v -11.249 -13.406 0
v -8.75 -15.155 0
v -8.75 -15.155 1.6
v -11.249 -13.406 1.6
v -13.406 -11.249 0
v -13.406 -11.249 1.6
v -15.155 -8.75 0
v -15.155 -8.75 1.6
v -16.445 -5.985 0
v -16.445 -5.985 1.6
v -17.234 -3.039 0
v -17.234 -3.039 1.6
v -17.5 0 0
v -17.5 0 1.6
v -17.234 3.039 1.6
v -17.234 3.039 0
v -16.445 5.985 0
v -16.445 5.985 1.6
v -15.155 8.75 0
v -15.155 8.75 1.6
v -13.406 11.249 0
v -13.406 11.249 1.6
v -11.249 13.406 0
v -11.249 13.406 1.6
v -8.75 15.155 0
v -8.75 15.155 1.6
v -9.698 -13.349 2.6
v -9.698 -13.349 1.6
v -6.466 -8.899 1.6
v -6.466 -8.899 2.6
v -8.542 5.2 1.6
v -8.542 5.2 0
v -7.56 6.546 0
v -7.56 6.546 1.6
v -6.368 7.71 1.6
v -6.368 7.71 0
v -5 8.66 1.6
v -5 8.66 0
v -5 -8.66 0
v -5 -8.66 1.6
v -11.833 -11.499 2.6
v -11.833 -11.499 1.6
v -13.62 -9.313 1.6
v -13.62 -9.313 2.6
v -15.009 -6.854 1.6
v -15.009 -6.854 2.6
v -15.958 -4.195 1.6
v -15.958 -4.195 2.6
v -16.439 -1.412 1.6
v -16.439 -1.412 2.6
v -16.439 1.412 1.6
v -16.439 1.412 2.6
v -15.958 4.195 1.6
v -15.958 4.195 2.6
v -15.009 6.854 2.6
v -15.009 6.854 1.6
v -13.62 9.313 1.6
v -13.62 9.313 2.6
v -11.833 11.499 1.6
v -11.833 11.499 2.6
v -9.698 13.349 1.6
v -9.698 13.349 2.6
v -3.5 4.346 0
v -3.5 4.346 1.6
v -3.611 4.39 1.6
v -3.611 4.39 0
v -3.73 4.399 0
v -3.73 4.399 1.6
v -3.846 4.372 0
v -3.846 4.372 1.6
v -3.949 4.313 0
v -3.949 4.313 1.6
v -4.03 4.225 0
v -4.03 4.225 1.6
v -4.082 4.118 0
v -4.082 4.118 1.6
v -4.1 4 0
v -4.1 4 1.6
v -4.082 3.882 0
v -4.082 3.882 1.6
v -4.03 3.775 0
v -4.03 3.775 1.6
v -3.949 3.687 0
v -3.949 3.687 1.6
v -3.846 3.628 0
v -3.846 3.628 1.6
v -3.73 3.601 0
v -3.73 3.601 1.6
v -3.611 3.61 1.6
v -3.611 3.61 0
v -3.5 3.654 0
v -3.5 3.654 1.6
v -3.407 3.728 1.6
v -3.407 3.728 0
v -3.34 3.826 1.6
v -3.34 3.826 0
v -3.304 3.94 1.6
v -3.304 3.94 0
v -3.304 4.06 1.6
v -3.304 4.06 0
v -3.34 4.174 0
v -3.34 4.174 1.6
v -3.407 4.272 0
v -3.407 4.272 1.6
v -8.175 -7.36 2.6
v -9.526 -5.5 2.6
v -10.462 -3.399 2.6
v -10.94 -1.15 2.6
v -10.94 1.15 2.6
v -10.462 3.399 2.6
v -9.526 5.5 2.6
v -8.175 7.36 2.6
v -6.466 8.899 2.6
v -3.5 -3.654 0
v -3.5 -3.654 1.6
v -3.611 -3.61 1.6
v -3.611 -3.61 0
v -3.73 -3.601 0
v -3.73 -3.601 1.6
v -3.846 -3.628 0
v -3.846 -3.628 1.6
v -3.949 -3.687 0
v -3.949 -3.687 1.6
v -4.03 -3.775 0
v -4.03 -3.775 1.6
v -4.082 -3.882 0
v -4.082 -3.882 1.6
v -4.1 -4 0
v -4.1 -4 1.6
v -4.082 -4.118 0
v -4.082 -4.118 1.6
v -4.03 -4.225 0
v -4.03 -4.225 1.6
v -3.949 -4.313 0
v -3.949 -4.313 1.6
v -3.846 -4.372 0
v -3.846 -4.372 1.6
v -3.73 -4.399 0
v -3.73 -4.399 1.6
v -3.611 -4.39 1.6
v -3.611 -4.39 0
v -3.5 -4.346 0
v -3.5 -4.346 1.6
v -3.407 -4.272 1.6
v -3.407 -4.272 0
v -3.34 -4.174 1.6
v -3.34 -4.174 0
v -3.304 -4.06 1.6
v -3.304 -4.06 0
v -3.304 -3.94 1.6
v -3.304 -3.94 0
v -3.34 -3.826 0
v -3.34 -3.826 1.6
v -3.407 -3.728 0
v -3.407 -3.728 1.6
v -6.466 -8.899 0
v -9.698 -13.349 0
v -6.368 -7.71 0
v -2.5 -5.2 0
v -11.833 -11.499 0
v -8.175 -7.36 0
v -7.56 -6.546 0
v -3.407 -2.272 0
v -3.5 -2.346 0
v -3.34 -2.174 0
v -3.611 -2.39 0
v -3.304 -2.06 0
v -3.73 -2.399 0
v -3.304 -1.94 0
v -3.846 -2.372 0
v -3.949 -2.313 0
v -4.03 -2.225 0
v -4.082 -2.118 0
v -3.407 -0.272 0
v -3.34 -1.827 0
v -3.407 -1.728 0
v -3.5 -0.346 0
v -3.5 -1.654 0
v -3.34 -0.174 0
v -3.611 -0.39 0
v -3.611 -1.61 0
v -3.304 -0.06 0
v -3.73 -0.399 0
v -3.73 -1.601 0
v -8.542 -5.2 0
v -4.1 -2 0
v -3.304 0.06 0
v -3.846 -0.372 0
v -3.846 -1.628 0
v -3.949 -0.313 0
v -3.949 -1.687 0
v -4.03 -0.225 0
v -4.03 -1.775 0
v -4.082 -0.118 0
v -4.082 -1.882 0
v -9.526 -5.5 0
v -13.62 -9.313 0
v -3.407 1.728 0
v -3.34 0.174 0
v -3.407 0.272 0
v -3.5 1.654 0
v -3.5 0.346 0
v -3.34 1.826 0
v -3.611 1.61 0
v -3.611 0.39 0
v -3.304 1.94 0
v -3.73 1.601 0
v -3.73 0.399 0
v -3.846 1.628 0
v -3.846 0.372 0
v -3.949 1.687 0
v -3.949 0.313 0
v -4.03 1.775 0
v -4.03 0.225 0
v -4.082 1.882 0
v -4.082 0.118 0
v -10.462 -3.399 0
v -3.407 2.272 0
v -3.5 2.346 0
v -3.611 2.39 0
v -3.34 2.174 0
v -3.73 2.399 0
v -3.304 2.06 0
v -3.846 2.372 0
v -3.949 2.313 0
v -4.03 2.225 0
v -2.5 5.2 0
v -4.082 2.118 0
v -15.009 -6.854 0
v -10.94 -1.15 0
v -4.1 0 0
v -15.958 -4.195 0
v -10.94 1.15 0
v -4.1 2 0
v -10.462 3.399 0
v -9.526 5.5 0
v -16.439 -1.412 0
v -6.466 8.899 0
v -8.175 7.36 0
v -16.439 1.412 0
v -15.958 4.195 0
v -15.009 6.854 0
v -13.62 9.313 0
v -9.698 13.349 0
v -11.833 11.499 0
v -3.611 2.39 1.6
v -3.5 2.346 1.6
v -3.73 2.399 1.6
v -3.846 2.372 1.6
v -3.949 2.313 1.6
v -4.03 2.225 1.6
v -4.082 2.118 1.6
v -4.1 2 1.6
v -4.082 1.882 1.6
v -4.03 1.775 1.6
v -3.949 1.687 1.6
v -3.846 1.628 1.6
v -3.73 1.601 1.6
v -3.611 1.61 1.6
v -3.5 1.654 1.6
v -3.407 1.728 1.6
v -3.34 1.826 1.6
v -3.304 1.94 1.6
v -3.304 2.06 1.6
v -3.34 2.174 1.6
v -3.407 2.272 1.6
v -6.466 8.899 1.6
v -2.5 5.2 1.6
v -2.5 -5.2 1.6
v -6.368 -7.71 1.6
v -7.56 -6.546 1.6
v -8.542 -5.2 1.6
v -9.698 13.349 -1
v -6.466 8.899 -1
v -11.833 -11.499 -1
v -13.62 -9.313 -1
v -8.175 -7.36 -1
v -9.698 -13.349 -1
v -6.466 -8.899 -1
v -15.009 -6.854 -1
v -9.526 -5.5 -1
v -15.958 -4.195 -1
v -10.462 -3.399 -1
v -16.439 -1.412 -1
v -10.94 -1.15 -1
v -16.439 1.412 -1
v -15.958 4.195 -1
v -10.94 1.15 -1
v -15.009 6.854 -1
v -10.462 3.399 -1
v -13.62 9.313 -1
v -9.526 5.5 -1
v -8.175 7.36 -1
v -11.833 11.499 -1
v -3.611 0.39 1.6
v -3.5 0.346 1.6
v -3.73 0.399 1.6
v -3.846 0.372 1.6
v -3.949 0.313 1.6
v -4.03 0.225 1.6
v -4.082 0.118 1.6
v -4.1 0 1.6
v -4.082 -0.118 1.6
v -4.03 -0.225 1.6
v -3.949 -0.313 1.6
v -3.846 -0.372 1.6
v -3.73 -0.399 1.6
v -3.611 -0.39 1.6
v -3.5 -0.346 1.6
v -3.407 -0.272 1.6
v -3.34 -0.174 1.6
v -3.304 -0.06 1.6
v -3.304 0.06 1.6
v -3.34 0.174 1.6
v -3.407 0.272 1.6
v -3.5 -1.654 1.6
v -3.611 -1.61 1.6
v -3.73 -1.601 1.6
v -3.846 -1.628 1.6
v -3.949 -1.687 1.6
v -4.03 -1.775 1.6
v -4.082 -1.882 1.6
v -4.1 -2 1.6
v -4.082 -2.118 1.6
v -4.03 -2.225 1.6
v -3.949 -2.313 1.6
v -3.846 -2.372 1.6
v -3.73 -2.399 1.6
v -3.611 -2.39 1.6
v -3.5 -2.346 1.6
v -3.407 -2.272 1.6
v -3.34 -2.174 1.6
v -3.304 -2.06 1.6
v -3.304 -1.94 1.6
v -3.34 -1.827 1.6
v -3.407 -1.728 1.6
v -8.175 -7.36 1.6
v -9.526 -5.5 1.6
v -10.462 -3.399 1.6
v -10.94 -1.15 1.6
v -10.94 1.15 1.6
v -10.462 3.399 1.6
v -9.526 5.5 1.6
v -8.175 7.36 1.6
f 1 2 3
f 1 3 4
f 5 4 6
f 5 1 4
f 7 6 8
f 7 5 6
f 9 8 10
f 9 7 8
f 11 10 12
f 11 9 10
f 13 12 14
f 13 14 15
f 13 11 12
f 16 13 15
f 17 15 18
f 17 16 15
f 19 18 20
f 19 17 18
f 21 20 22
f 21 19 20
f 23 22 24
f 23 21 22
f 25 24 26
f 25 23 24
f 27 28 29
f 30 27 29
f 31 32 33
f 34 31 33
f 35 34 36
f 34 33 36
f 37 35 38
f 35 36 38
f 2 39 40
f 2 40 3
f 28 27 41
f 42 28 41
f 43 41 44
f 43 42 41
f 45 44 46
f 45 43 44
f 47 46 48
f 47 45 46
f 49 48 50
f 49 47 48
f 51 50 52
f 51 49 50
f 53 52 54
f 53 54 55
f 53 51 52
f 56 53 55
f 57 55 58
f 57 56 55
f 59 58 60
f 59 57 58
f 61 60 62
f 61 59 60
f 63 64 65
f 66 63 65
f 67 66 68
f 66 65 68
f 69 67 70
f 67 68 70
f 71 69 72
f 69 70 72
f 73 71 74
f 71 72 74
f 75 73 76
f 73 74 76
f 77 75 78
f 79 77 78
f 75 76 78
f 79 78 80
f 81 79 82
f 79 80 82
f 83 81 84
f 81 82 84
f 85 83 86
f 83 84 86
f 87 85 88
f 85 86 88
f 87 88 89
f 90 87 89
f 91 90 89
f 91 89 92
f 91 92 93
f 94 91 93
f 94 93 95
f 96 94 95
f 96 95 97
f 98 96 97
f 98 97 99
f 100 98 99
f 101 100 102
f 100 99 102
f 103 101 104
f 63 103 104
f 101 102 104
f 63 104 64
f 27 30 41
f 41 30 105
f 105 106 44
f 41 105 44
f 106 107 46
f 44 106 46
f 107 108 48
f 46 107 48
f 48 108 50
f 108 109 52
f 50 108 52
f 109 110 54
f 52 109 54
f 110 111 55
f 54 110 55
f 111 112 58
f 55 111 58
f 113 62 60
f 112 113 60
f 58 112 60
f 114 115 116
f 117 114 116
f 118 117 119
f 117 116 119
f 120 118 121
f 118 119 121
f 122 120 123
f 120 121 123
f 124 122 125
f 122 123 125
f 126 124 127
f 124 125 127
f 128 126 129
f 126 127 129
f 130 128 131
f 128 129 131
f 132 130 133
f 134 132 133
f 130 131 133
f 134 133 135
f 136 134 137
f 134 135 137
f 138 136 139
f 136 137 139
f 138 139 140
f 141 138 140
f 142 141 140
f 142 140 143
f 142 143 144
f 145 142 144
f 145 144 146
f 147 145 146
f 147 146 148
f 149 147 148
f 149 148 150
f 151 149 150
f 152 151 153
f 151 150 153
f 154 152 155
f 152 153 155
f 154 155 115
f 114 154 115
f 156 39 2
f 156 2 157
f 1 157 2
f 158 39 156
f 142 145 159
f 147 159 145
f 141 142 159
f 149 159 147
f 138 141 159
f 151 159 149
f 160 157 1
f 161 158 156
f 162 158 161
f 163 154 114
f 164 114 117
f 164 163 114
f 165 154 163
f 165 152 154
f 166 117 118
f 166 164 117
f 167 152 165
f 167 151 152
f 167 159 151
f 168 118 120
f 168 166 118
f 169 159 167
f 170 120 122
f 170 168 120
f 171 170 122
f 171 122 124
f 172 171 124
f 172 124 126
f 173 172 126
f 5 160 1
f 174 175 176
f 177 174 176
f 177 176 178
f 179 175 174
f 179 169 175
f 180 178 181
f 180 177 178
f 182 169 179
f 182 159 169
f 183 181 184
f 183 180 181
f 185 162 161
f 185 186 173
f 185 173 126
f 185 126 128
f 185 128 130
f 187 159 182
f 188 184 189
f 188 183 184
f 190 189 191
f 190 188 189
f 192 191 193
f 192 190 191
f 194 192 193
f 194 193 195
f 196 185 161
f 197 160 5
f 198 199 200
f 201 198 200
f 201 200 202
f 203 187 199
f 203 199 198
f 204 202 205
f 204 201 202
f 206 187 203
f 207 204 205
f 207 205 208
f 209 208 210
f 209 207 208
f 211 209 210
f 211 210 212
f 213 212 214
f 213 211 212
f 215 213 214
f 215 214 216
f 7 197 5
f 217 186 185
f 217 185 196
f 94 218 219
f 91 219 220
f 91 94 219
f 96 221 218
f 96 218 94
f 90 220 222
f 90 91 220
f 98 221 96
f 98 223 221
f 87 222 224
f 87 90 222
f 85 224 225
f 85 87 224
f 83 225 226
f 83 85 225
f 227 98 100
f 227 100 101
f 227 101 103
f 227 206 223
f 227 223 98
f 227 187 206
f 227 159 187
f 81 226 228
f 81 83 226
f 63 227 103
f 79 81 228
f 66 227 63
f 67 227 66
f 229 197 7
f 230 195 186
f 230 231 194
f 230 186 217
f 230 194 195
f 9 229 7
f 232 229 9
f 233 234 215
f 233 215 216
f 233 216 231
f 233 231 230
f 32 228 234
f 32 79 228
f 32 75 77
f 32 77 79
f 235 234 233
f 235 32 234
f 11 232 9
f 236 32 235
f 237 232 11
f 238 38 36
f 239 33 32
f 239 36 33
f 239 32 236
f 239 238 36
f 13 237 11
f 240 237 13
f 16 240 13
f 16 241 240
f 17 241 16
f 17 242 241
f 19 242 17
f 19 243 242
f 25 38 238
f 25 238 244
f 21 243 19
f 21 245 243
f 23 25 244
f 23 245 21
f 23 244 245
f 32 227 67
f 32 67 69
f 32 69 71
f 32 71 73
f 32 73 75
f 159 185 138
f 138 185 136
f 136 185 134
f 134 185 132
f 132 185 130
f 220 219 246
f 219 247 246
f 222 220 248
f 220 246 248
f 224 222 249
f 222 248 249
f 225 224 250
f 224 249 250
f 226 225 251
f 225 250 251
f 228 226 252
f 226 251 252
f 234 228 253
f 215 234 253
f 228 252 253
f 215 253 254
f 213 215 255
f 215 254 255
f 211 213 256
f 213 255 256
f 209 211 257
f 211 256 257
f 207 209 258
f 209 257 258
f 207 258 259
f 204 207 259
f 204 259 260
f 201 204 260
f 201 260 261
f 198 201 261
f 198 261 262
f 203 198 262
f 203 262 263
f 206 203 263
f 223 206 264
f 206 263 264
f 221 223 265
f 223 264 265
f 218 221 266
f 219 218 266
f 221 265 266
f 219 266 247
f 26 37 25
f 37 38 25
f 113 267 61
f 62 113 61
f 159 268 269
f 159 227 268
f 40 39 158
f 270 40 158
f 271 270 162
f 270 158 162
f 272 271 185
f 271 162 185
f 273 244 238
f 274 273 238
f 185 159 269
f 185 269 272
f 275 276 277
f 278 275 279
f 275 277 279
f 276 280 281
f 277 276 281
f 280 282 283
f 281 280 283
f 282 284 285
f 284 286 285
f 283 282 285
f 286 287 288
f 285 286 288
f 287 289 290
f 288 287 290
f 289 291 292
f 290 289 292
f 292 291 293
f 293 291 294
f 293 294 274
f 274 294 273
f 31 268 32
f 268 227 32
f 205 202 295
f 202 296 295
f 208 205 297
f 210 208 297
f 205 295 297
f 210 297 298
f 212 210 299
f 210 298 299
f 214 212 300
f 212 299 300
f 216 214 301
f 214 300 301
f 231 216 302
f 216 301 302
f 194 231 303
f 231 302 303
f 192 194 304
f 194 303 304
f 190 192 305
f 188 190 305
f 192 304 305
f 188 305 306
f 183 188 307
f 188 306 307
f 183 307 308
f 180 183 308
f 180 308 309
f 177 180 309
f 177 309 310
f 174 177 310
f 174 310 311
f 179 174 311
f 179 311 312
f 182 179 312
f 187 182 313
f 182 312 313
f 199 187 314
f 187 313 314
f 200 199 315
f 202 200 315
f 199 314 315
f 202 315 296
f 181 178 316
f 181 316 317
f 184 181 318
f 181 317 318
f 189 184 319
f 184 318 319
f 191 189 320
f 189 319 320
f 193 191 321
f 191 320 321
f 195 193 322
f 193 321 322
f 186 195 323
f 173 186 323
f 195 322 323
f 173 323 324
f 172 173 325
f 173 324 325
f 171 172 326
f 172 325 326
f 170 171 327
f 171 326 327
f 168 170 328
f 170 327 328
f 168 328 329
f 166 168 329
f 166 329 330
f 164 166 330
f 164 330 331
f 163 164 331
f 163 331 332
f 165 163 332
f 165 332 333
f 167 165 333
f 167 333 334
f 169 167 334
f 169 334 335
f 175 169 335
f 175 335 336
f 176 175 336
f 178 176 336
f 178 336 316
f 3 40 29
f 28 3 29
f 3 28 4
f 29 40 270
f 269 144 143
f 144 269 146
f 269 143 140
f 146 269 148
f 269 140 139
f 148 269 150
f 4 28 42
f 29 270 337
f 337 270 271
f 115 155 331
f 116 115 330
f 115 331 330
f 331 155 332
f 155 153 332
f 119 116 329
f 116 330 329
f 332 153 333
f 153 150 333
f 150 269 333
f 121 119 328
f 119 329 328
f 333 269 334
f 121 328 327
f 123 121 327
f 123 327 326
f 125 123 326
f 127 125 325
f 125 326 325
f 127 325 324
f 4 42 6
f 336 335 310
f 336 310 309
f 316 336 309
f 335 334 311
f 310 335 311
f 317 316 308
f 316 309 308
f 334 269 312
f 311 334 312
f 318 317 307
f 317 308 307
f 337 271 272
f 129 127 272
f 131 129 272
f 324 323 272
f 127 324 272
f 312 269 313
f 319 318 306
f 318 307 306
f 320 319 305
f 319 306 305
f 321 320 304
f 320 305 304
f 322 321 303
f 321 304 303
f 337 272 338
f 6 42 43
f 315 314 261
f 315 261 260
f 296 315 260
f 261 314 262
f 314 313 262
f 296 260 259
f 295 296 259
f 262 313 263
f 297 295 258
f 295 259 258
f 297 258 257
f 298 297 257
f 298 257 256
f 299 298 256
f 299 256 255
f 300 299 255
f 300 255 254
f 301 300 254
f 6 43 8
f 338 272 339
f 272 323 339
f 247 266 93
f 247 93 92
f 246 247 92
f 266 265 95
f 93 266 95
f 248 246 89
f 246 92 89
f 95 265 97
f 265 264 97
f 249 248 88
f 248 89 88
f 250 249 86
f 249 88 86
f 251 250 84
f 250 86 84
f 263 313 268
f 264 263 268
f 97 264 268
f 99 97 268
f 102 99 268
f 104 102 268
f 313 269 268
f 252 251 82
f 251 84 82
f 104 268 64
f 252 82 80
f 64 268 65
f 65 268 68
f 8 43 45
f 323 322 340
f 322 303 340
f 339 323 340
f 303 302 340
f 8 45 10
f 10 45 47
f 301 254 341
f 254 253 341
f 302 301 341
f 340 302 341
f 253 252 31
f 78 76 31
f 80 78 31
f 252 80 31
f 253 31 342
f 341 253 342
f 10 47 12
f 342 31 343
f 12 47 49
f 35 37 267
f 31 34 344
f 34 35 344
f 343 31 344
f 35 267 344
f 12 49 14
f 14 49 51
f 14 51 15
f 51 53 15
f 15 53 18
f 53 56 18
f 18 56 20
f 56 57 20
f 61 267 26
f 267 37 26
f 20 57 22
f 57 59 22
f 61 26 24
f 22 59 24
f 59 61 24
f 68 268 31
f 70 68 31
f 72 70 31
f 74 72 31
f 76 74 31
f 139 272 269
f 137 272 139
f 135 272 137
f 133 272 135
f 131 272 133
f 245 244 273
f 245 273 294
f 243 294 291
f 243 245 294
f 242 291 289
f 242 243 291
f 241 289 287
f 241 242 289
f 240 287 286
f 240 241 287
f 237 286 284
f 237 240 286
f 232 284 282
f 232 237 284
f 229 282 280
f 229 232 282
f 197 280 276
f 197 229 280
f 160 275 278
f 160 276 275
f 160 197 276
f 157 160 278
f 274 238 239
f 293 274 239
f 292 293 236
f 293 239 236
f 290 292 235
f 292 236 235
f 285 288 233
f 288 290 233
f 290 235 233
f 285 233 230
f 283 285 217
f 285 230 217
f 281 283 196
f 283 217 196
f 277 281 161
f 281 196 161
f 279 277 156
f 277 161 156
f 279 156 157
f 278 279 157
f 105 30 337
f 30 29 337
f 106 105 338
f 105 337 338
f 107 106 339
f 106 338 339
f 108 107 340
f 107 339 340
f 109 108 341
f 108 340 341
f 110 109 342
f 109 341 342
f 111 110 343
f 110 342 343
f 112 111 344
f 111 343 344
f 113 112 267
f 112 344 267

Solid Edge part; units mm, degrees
sketch "Sketch1" plane through (0, 0, 0) normal (0, 0, 1) x (1, 0, 0)
  line L0 (-2.5, -5.2) -> (-8.5417, -5.2)
  line L1 (-5, -8.6603) -> (-8.75, -15.1554)
  line L2 (-5, 8.6603) -> (-8.75, 15.1554)
  arc A0 (-8.5417, 5.2) -> (-5, 8.6603) centre (0, 0) cw
  line L3 (-2.5, 5.2) -> (-8.5417, 5.2)
  line L4 (-2.5, 5.2) -> (-2.5, -5.2)
  arc A1 (-5, -8.6603) -> (-8.5417, -5.2) centre (0, 0) cw
  arc A2 (-8.75, -15.1554) -> (-8.75, 15.1554) centre (0, 0) cw
extrude "Protrusion1" add sketch "Sketch1" along normal blind 1.6
sketch "Sketch2" plane through (-10, 0, 1.6) normal (0, 0, 1) x (0.5, 0.866, 0)
  arc A0 (-11.4096, -6.9355) -> (11.7112, 6.4132) centre (5, -8.6603) cw
  line L0 (9.4741, 1.3887) -> (11.7112, 6.4132)
  arc A1 (-5.9397, -7.5104) -> (9.4741, 1.3887) centre (5, -8.6603) cw
  line L1 (-11.4096, -6.9355) -> (-5.9397, -7.5104)
extrude "ProtrusiónExtruida_2" add sketch "Sketch2" along normal blind 1
mirror "Mirror1" about plane through (0, 0, 0.8) normal (0, 0, 1) of "ProtrusiónExtruida_2"
sketch "Sketch3" plane through (-10, 0, 1.6) normal (0, 0, 1) x (0.5, 0.866, 0)
  circle A0 centre (6.6141, -3.456) radius 0.4
  circle A1 centre (4.8821, -4.456) radius 0.4
  circle A2 centre (3.15, -5.456) radius 0.4
  circle A3 centre (1.4179, -6.456) radius 0.4
  circle A4 centre (-0.3141, -7.456) radius 0.4
extrude "Cutout1" cut sketch "Sketch3" against normal through all
